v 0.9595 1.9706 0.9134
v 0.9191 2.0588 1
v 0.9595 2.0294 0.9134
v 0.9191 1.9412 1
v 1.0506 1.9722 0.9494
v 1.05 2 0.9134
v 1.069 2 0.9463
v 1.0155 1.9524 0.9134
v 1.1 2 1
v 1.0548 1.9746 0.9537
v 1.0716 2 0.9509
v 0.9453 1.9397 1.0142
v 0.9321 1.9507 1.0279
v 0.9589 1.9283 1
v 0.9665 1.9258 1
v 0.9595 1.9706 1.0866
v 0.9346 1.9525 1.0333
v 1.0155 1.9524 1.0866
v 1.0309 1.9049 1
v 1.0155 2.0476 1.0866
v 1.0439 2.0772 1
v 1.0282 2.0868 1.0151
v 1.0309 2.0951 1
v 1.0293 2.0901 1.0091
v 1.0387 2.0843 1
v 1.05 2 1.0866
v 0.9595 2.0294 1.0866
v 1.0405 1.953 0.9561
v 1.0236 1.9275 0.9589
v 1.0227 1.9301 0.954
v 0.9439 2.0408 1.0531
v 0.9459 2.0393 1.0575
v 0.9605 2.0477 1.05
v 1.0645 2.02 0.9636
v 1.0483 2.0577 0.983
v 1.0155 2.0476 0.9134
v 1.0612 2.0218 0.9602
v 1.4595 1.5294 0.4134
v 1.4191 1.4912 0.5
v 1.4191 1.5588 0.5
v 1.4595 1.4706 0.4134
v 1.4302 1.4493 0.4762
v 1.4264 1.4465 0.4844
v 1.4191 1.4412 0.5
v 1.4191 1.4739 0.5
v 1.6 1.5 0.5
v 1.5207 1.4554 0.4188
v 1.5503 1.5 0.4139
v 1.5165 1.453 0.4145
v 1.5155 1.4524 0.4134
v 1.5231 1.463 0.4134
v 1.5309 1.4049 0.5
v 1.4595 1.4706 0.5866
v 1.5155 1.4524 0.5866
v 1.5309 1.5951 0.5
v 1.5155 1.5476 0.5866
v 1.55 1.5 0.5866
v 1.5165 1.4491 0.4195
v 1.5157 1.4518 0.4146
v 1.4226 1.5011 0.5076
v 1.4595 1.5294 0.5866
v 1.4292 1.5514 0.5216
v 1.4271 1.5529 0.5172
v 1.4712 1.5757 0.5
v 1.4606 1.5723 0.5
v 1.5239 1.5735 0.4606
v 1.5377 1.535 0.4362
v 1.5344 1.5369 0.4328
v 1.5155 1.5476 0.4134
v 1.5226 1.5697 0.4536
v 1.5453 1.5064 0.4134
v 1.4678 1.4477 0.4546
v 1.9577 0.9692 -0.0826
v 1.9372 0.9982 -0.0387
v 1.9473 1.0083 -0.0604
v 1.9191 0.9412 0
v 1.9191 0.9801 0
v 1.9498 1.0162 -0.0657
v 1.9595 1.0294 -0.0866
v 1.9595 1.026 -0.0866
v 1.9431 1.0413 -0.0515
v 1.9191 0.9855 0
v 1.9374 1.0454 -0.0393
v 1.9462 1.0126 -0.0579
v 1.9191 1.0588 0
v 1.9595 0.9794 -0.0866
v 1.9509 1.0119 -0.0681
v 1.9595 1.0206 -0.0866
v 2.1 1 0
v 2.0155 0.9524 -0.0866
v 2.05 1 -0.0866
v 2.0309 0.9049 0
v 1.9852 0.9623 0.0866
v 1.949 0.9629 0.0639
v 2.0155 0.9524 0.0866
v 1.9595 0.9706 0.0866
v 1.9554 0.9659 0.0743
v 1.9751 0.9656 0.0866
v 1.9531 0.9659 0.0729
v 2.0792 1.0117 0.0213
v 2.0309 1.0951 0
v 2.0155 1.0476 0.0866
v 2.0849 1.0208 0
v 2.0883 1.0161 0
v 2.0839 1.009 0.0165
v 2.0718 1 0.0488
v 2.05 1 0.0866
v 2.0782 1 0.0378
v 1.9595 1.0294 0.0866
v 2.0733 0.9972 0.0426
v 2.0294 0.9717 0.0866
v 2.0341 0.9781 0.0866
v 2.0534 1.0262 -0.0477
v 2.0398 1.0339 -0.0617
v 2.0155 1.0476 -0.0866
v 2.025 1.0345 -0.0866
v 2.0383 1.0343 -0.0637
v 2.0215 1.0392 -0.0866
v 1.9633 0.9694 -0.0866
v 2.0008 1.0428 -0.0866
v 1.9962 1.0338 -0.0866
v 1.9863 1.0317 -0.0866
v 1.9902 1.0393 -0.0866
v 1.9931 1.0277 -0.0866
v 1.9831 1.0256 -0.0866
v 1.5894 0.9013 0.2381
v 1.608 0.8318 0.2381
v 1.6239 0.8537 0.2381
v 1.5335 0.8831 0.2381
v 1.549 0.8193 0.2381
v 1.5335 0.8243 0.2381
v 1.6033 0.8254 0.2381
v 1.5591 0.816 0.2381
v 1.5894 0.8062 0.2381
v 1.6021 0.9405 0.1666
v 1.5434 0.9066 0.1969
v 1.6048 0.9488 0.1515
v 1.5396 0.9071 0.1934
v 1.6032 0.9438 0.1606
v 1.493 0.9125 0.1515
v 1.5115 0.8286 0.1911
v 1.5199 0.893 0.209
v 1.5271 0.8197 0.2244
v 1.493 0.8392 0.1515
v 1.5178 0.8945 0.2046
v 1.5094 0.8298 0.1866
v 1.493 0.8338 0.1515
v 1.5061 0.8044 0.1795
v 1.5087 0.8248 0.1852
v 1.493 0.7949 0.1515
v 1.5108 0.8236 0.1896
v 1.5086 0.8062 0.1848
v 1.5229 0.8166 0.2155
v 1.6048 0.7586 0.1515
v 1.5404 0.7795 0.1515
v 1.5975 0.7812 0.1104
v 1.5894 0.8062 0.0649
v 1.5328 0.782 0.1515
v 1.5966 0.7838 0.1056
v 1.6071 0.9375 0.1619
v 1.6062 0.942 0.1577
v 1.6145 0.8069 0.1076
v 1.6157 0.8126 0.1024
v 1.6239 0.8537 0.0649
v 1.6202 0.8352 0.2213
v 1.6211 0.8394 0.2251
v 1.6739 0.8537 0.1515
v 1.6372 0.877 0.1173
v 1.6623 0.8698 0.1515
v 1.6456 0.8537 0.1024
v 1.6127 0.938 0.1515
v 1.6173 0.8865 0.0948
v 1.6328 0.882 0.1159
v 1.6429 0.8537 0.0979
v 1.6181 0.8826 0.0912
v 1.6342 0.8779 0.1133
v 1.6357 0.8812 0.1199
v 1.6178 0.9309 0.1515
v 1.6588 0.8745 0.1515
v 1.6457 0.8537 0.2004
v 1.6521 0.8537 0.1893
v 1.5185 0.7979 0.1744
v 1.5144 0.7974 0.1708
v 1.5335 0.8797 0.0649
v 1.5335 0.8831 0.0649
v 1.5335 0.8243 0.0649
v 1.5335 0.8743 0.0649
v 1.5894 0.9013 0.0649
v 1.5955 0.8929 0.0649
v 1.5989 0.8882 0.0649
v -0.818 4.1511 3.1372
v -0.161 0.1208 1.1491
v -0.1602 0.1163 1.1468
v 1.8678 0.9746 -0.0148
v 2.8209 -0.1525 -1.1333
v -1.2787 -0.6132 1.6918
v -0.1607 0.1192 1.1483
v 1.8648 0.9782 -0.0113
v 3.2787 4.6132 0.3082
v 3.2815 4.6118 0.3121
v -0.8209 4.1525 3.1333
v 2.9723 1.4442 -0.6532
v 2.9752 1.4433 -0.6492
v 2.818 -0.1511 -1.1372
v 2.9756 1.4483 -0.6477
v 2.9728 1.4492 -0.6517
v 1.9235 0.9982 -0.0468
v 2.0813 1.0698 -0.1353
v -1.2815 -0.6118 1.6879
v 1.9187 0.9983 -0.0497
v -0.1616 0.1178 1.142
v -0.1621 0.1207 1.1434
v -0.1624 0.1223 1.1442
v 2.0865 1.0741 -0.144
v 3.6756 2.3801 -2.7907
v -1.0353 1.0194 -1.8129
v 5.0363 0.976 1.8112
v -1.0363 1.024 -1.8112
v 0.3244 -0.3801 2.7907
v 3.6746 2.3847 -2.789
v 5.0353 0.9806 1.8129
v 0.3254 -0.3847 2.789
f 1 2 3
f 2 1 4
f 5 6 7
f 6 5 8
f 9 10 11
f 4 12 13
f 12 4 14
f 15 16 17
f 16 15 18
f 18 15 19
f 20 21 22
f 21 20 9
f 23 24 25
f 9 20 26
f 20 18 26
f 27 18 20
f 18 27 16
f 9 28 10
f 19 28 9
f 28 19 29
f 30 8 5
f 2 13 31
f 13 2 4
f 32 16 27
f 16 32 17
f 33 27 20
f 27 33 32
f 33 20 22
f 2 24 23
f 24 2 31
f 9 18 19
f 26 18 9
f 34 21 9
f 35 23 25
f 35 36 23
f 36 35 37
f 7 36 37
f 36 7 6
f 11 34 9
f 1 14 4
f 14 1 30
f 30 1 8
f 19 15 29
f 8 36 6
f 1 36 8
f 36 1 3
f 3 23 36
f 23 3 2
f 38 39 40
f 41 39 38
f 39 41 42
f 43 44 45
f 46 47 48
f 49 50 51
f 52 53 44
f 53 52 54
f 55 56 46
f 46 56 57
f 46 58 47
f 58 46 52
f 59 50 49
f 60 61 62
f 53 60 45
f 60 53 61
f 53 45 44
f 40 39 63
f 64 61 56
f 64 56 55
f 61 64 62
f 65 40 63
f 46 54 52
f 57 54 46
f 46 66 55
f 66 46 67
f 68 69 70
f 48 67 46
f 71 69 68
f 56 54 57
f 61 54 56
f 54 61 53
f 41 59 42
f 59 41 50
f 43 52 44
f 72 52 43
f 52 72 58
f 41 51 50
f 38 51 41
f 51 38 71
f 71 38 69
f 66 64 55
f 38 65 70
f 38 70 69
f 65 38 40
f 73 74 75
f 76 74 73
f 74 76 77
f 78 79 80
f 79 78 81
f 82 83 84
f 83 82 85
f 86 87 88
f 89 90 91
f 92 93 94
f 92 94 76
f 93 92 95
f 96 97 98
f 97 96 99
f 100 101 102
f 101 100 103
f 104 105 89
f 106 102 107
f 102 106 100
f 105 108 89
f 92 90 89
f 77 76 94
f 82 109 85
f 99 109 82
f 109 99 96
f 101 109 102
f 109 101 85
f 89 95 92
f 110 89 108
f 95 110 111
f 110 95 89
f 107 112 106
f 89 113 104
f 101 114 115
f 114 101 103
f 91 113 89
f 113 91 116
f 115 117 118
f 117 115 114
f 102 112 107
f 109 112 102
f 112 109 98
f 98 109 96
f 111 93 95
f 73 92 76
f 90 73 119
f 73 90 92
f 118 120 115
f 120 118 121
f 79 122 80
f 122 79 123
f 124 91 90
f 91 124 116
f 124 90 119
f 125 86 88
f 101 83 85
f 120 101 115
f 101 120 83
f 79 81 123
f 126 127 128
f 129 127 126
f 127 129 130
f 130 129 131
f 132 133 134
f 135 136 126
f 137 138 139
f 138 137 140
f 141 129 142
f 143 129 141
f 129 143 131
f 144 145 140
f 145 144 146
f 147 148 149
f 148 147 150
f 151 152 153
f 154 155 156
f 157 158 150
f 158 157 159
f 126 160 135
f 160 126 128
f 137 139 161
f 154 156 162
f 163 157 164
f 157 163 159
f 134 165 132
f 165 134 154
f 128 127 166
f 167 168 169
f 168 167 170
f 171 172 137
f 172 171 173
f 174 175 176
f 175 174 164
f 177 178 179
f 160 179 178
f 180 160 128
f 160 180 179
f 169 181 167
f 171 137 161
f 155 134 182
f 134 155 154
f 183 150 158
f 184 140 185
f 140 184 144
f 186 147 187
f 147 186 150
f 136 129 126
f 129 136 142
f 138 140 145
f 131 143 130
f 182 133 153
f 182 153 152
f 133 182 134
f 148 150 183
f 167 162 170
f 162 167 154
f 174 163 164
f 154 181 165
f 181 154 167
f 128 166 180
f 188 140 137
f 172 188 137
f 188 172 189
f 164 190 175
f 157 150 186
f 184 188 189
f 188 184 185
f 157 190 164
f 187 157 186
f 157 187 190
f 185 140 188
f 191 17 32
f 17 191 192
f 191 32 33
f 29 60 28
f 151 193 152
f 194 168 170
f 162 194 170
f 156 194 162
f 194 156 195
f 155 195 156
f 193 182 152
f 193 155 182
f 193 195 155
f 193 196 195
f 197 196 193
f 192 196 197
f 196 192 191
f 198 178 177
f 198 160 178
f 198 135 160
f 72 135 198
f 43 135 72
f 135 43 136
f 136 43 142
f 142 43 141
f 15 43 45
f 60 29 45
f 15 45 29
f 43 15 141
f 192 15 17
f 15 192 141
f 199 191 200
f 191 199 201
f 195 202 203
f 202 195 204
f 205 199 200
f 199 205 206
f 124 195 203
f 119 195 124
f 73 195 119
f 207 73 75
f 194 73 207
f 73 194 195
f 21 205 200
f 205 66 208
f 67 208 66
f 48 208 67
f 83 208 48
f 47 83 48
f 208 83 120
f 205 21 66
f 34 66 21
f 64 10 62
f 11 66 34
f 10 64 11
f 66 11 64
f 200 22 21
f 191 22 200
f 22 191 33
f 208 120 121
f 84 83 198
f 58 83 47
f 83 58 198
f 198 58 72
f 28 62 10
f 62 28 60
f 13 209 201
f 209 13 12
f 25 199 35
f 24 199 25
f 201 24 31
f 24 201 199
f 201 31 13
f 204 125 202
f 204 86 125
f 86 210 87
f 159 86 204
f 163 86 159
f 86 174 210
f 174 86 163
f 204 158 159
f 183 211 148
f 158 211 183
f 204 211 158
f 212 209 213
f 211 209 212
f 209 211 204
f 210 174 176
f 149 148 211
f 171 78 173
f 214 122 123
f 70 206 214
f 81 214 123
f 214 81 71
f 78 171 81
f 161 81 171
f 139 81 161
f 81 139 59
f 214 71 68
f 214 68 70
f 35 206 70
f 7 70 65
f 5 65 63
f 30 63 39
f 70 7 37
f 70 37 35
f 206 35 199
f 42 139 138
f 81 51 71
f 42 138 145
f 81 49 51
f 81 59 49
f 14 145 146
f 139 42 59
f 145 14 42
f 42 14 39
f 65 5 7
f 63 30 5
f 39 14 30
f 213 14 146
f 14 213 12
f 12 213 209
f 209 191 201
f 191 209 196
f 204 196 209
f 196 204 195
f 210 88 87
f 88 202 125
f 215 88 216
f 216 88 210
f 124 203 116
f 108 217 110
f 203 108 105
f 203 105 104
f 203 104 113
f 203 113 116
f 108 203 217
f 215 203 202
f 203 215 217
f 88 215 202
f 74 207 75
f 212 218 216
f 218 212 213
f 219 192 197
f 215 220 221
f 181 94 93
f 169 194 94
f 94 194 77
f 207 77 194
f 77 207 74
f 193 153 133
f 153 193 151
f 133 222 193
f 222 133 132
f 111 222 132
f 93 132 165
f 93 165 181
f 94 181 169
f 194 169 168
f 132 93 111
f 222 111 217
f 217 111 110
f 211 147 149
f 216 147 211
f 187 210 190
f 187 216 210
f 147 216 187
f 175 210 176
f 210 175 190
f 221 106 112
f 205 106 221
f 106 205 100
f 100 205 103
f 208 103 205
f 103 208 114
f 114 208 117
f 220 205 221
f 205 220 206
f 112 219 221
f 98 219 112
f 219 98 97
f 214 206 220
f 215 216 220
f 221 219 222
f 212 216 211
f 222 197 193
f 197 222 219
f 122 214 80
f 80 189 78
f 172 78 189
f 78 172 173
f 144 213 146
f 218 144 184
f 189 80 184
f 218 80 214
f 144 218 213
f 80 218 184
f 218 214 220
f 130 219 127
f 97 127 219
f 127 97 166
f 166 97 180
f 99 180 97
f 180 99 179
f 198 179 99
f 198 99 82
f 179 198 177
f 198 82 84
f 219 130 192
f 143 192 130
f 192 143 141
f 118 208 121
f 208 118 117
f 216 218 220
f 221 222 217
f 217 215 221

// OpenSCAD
a=[[1,2,1],un(rands(-1,1,3))];
b=[[2,1,0],un(rands(-1,1,3))];
m=(a+b)/2;
translate(a[0])sphere(.1);
translate(m[0])sphere(.1);
translate(b[0])sphere(.1);
solution=intersectPlanes(a,b);

translate(solution )sphere(.1);
 
 
echo(solution);
 #translate(a[0]) look_at(a[1])cube([1,1,.001]*5 ,center=true);
 #translate(b[0]) look_at(b[1])cube([1,1,.001]*5 ,center=true);


function intersectPlanes(p1,p2)=
let( 
np3=cross(p1[1],p2[1]),
bp1=baseform(p1),bp2=baseform(p2),
det= norm(np3)*norm(np3),
m=(p1[0]+p2[0])/2,
point=-(( cross(np3,bp2[0]) * bp1[1]) + (cross(bp1[0],np3) * bp2 [1])) / det
 )
   point_to_line(m ,point,point+np3 )
; 
function baseform(pn)=[pn[1],distance_point2plane(pn[0],[0,0,0], pn[1]) ];
function point_to_line( p, a, b )=let(ap = p-a, ab = b-a) a + dot(ap,ab)/dot(ab,ab) * ab ;
function distance_point2plane(point, planes_origin, planes_normal) =
let (v = point - planes_origin) v.x * planes_normal.x + v.y * planes_normal.y + v.z * planes_normal.z ; 


function un(v) = v / max(norm(v), 0.000001) * 1; // div by zero safe unit normal

function dot(a,b)=a*b;
function clamp(a, b = 0, c = 1) = min(max(a, b), c);



 module look_at(lookpoint,origin=[0,0,0],rotatefrom=[0,0,1]){
rotations=look_at(lookpoint,origin ,rotatefrom);
rotate(rotations[0],rotations[1]) children();
}
function look_at(p,o=[0,0,0],up=[0,0,1])=
let(
a=up,
b=p-o,
c=cross(a,b) ,
d=angle(a,b))
[d,c];

function angle (a,b)=
atan2(
sqrt((cross(a, b)*cross(a, b))), 
(a* b)
);
